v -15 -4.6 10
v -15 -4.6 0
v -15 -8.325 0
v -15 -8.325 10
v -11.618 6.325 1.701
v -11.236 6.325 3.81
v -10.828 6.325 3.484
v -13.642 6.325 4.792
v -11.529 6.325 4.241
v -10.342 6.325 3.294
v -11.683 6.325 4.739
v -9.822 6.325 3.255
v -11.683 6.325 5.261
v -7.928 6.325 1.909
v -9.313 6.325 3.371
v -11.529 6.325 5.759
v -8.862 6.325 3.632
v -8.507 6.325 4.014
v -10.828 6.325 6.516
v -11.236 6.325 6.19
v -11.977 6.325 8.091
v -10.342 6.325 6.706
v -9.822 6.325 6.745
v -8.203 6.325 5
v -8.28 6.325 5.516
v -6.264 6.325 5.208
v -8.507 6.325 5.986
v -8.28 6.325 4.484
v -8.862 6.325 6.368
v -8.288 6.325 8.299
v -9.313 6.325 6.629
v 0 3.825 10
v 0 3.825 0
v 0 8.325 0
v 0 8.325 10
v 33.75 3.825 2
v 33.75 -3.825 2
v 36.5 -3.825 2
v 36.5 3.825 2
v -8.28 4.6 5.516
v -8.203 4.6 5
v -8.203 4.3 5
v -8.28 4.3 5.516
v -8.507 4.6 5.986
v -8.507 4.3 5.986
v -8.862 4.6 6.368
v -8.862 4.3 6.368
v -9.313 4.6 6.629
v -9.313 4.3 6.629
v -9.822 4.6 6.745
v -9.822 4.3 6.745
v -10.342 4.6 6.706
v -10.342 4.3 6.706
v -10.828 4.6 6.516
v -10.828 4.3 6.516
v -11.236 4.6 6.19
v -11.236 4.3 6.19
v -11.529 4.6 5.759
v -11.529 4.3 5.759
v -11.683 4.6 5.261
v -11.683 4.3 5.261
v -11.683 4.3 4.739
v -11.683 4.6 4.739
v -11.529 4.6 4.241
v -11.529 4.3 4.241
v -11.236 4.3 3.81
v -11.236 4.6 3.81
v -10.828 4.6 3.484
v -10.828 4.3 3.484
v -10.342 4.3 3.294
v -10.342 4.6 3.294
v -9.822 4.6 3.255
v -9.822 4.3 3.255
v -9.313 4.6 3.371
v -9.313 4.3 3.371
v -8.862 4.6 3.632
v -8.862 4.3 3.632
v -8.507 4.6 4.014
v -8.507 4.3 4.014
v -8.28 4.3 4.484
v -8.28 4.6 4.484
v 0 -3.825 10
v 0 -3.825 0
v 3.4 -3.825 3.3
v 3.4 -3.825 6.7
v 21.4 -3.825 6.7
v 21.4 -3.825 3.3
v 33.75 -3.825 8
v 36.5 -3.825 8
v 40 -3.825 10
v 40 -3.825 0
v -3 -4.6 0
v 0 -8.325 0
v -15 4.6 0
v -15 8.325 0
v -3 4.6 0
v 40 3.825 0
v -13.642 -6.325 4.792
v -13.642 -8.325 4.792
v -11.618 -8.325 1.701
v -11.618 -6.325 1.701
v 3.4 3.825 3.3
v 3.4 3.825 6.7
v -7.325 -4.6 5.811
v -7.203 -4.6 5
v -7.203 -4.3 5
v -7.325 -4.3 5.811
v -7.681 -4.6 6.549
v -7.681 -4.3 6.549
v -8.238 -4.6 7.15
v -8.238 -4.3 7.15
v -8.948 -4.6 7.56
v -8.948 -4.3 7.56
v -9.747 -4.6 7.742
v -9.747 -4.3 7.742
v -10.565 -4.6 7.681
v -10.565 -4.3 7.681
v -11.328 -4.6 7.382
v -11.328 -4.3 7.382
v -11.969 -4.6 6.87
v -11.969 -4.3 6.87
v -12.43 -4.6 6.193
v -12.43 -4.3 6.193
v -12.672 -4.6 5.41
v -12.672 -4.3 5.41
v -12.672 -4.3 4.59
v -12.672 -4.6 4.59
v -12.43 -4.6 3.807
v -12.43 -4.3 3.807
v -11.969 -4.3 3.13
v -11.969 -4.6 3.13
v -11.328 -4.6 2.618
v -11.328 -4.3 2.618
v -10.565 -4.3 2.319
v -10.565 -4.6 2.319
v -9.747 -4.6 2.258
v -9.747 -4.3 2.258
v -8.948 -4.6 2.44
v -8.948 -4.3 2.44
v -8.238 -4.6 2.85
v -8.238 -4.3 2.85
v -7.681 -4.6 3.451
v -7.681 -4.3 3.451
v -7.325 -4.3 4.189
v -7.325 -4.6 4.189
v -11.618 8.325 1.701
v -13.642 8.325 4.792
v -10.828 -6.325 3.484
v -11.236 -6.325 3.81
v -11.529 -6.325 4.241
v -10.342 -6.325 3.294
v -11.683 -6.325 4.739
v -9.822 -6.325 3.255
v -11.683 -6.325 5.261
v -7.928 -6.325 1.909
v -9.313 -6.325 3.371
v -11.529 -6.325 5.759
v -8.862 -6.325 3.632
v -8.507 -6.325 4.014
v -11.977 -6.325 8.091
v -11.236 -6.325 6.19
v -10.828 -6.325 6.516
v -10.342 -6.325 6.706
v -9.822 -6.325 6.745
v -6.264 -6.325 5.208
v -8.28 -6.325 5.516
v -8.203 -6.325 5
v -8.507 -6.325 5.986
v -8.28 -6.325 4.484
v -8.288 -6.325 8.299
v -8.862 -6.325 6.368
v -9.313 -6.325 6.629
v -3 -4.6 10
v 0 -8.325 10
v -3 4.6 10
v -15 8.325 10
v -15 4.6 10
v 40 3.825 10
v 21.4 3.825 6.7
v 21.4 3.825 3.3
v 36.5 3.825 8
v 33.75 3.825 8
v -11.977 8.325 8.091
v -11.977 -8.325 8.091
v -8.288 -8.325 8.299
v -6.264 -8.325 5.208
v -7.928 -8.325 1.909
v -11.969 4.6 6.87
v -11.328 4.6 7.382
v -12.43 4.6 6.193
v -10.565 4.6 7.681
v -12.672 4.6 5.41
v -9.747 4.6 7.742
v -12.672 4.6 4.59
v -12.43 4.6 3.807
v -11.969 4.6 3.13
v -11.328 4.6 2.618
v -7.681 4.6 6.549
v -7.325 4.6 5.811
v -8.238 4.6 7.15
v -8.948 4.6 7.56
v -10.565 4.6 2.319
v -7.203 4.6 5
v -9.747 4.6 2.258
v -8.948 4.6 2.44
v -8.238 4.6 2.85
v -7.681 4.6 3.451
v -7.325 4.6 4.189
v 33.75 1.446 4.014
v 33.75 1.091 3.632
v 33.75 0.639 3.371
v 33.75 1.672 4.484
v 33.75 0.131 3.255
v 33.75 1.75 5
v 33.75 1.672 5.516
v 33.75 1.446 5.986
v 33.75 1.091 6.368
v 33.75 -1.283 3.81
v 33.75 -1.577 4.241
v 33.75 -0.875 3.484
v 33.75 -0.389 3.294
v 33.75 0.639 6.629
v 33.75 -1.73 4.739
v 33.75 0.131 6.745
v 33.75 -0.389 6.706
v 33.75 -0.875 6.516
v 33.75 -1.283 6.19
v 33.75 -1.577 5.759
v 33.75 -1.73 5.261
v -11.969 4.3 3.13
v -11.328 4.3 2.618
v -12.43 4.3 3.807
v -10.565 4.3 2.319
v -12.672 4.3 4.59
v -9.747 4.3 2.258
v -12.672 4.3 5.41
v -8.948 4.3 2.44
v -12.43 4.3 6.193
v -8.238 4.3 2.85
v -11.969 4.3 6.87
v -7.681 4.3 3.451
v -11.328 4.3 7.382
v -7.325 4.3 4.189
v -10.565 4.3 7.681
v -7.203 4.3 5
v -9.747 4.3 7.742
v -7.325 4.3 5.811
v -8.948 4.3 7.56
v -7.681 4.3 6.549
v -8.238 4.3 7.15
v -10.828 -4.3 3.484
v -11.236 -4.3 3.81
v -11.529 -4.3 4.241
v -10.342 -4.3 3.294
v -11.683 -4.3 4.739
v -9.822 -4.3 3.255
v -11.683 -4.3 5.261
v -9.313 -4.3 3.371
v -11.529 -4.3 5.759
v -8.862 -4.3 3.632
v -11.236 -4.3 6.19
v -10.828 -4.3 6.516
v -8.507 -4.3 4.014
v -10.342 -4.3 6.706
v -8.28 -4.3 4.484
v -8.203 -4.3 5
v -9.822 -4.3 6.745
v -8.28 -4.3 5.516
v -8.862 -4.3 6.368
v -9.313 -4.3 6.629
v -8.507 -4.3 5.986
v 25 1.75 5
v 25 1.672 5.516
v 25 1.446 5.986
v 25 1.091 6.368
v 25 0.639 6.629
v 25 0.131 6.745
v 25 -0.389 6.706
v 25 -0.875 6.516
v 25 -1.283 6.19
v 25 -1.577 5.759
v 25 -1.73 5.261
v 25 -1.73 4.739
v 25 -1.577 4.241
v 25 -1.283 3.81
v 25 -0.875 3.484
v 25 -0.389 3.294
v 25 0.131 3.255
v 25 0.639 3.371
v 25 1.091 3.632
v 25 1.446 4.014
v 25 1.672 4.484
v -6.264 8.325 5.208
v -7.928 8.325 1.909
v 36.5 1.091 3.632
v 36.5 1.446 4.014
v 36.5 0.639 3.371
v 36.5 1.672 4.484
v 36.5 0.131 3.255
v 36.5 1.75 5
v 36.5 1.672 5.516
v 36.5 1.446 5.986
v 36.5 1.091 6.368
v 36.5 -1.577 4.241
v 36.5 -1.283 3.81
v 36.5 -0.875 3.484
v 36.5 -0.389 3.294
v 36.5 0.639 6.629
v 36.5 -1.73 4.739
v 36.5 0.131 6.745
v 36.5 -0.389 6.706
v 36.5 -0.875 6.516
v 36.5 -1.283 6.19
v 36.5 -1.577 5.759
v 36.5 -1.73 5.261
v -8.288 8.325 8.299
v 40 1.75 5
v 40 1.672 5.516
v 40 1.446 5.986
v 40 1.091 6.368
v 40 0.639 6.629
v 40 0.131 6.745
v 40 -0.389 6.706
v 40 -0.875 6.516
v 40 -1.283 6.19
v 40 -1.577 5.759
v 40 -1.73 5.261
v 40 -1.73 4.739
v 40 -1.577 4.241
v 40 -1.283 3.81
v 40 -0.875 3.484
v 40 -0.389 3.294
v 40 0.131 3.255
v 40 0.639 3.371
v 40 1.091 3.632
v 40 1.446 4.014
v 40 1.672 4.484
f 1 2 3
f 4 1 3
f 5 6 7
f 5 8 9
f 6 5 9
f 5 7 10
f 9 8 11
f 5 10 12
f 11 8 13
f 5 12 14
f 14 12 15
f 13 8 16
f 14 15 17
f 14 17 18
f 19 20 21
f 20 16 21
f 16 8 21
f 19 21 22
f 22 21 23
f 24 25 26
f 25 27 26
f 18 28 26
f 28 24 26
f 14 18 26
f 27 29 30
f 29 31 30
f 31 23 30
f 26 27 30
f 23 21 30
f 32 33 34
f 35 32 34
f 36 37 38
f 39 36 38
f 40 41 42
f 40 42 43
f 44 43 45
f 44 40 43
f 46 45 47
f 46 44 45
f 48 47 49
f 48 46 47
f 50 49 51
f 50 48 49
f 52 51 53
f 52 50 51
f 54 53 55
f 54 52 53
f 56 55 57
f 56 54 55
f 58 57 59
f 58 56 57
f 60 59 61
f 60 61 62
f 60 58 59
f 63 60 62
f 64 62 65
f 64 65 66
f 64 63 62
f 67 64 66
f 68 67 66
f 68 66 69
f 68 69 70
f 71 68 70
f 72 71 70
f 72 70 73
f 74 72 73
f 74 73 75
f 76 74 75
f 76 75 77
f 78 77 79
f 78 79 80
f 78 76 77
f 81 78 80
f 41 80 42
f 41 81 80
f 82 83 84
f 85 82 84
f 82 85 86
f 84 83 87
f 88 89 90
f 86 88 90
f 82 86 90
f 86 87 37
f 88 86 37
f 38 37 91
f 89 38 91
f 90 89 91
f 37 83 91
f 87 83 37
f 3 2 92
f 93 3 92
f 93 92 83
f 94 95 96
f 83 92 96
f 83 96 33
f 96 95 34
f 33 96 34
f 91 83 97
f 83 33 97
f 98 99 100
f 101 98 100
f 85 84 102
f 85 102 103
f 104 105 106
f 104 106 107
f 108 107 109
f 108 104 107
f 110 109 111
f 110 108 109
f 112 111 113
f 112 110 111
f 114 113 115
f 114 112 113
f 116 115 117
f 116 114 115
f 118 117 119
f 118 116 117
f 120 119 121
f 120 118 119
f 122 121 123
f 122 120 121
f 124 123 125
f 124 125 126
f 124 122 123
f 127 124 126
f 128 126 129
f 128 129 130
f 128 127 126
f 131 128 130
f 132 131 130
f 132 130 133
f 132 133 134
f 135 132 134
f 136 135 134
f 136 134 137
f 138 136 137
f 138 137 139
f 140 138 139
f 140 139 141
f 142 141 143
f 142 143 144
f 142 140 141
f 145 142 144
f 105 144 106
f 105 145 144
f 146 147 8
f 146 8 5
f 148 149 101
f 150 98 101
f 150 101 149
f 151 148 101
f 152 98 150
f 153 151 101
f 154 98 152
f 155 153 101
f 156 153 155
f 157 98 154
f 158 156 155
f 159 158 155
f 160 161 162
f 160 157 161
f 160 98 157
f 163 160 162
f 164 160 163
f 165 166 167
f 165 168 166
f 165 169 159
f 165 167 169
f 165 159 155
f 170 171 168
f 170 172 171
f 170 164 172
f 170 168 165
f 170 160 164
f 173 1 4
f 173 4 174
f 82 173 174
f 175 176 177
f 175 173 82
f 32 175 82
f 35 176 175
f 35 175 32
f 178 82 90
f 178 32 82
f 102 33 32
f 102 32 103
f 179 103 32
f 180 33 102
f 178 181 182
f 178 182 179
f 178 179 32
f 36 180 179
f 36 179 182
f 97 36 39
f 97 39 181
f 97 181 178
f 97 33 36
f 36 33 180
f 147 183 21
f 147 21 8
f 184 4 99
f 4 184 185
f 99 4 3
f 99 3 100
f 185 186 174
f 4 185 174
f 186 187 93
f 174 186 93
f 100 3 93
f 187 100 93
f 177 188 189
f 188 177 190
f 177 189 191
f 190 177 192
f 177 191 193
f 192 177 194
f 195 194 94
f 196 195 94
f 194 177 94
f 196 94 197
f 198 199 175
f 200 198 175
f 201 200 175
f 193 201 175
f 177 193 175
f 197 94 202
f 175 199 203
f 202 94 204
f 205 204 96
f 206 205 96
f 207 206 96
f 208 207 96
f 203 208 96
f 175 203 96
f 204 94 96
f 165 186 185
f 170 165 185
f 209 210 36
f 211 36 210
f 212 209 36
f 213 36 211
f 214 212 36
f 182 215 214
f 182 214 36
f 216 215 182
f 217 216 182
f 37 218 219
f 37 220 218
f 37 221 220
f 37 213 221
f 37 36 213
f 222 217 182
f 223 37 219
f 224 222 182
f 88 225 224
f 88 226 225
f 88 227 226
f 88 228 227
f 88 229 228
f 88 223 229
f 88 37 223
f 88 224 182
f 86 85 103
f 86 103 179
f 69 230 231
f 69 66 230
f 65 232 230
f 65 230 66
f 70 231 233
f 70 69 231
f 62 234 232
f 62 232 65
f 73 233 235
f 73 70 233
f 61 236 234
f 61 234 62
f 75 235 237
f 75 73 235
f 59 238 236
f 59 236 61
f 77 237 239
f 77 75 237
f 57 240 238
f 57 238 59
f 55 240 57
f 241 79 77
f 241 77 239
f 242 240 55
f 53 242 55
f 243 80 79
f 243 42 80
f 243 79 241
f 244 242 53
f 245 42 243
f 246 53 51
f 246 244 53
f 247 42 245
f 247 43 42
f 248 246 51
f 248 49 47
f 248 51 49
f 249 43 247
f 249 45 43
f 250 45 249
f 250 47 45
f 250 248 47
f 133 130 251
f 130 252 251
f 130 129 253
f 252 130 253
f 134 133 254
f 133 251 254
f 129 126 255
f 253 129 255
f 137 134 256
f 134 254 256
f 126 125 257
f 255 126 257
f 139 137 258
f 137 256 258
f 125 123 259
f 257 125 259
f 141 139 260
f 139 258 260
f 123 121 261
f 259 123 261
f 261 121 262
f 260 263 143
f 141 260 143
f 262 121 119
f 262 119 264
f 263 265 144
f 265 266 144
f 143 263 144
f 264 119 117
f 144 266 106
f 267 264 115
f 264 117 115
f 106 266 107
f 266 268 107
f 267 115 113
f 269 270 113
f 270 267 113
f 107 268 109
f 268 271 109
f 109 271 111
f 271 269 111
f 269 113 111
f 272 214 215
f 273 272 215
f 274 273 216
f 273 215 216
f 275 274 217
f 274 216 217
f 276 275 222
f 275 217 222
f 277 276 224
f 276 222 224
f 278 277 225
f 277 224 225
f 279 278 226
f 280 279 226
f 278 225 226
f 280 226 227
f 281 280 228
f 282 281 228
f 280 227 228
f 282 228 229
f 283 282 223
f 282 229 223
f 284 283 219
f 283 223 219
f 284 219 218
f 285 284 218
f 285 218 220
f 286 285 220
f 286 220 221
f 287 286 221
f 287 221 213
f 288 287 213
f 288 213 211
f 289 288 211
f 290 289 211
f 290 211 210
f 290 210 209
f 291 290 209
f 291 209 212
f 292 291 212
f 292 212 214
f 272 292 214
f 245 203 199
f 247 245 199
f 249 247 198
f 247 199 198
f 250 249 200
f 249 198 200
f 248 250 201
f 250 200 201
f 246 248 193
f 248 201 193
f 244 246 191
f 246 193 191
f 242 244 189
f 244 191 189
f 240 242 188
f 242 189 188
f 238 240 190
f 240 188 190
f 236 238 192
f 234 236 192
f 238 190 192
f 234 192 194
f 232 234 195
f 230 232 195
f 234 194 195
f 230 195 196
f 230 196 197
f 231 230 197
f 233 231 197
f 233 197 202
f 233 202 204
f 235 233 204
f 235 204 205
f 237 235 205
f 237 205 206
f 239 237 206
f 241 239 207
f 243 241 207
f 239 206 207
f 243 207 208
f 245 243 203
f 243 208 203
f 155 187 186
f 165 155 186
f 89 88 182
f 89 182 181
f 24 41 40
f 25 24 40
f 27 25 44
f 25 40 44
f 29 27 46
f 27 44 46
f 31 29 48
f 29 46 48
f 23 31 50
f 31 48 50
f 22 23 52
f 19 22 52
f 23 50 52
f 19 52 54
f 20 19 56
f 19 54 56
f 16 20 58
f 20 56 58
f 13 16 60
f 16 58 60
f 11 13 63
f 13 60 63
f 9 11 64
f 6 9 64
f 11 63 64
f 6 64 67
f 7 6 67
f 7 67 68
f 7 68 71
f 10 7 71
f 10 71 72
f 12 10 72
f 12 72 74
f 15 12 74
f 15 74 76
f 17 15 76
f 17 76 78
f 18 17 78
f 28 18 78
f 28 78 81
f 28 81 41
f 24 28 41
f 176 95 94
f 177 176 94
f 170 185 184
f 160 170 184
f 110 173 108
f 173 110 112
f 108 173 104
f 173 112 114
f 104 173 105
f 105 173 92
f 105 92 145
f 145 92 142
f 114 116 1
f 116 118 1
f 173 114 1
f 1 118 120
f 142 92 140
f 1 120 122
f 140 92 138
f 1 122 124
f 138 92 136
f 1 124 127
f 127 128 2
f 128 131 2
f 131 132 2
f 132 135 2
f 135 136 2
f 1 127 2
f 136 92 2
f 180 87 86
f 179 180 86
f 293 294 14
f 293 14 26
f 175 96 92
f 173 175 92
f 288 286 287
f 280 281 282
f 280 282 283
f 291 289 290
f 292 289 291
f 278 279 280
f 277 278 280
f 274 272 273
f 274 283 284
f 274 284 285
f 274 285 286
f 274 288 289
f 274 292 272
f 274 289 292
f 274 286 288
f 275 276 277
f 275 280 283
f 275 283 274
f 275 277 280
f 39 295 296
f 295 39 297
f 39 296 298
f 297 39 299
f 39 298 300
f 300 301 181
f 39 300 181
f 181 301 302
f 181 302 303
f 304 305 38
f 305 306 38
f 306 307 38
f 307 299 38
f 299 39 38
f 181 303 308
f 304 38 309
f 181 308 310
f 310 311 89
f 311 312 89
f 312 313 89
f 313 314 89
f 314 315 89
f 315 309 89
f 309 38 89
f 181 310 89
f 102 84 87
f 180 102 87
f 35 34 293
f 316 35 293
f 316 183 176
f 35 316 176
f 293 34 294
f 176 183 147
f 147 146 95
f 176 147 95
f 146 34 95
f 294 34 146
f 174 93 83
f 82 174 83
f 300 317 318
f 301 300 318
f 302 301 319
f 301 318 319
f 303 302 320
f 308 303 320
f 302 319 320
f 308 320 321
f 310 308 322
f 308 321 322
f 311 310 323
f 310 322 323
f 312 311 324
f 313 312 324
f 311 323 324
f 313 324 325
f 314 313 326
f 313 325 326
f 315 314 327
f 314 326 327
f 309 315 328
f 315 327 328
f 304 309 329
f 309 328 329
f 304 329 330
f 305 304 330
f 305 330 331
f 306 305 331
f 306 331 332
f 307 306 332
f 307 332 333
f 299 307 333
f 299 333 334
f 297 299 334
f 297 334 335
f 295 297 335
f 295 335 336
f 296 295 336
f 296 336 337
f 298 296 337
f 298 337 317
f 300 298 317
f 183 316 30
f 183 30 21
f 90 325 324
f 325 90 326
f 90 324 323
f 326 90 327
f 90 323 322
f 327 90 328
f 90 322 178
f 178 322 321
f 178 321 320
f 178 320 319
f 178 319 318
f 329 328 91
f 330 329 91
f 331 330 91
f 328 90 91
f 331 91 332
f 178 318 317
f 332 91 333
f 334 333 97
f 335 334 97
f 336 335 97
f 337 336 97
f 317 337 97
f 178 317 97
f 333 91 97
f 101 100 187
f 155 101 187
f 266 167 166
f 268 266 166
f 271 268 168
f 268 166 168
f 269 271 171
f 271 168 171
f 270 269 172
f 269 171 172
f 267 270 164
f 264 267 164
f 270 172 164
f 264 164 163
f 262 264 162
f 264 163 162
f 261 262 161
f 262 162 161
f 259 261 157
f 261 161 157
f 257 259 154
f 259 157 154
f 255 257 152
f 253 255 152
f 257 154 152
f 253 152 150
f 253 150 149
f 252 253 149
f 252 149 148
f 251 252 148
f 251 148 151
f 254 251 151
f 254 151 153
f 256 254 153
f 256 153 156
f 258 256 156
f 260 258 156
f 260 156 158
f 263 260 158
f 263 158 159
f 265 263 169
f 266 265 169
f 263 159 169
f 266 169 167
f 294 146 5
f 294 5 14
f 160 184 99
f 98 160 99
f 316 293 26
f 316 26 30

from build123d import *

# Parameters (mm, degrees)
F0_W      = 40
F0_H      = 3.825
F1_DEPTH  = 10
F2_R      = 1.75
F3_DEPTH  = 16.651
F4_W      = 18
F4_H      = 3.4
F4_W_2    = 2.75
F4_H_2    = 6
F5_DEPTH  = 12.151
F6_R      = 1.75
F7_DEPTH  = 15
F10_DEPTH = 2
F11_W     = 17.65
F11_H     = 60
F12_DEPTH = 8
F13_R     = 1.75
F14_DEPTH = 70.001
F15_R     = 2.75
F15_R_2   = 1.75
F16_DEPTH = 0.3
F17_R     = 1.75
F18_DEPTH = 2
F19_R     = 3.75
F20_DEPTH = 1


# Not quite as in the source:
# - a pattern or mirror of a feature is missing from the dataset's text; its kind, count and spacing are read off the source's solid


with BuildPart() as f1:
    # F0 (on Top) → F1 (new body)
    with BuildSketch(Plane.XY):
        Polygon((0, -3.825), (0, 0), (-3, 0), (-3, -4.6), (-15, -4.6), (-15, -8.325), (0, -8.325), align=None)
        Polygon((-3, 0), (0, 0), (0, 3.825), (0, 8.325), (-15, 8.325), (-15, 4.6), (-3, 4.6), align=None)
        with Locations((20, 1.9125)):
            Rectangle(F0_W, F0_H)
        with Locations((20, -1.9125)):
            Rectangle(F0_W, F0_H)
    extrude(amount=F1_DEPTH)

    # F2 (on face) → F3 (cut, through all)
    with BuildSketch(Plane.XZ.offset(8.325)):
        with Locations((-9.9527407438, 5)):
            Circle(F2_R)
    extrude(amount=-F3_DEPTH, mode=Mode.SUBTRACT)

    # F4 (on face) → F5 (cut, through all)
    with BuildSketch(Plane.XZ.offset(3.825)):
        with Locations((12.4002694301, 5)):
            Rectangle(F4_W, F4_H)
        with Locations((35.125, 5)):
            Rectangle(F4_W_2, F4_H_2)
    extrude(amount=-F5_DEPTH, mode=Mode.SUBTRACT)

    # F6 (on face) → F7 (cut)
    with BuildSketch(Plane.YZ.offset(40)):
        with Locations((0, 5)):
            Circle(F6_R)
    extrude(amount=-F7_DEPTH, mode=Mode.SUBTRACT)

    # F15 (on face) → F16 (join)
    with BuildSketch(Plane.XZ.offset(-4.6)):
        with Locations((-9.9527407438, 5)):
            Circle(F15_R)
        with Locations((-9.9527407438, 5)):
            Circle(F15_R_2, mode=Mode.SUBTRACT)
    f16 = extrude(amount=F16_DEPTH)

    # F16_copies: F16 across plane
    add(f16.mirror(Plane(origin=(0, 0, 0), x_dir=(0, 0, -1), z_dir=(0, -1, 0))))

    # F17 (on face) → F18 (cut)
    with BuildSketch(Plane.XZ.offset(8.325)):
        Polygon((-7.9284293953, 1.9088033227), (-6.2635302189, 5.2075067143), (-8.2878415673, 8.2987033916), (-11.9770520922, 8.0911966773), (-13.6419512686, 4.7924932857), (-11.6176399202, 1.7012966084), align=None)
        with Locations((-9.9527407438, 5)):
            Circle(F17_R, mode=Mode.SUBTRACT)
    f18 = extrude(amount=-F18_DEPTH, mode=Mode.SUBTRACT)

    # F18_copies: F18 across plane
    add(f18.mirror(Plane.ZX), mode=Mode.SUBTRACT)


with BuildPart() as f10:
    # F9 (on offset) → F10 (new body)
    with BuildSketch(Plane.YZ.offset(45)):
        Polygon((3.825, 0), (3.825, 10), (3.825, 19.8484882712), (-3.825, 19.8484882712), (-3.825, 10), (-3.825, 0), (-3.825, -10.1515117288), (3.825, -10.1515117288), align=None)
    extrude(amount=F10_DEPTH)

    # F11 (on face) → F12 (join)
    with BuildSketch(Plane.YZ.offset(47)):
        with Locations((0, 4.8484882712)):
            Rectangle(F11_W, F11_H)
    extrude(amount=F12_DEPTH)

    # F13 (on face) → F14 (cut, through all)
    with BuildSketch(Plane.YZ.offset(55)):
        with Locations((0, 5)):
            Circle(F13_R)
    extrude(amount=-F14_DEPTH, mode=Mode.SUBTRACT)

    # F19 (on face) → F20 (join)
    with BuildSketch(Plane(origin=(47, 0, 0), x_dir=(0, -1, 0), z_dir=(-1, 0, 0))):
        with Locations((0, -18)):
            Circle(F19_R)
        with Locations((0, 28)):
            Circle(F19_R)
    extrude(amount=F20_DEPTH)


solid = f1.part
